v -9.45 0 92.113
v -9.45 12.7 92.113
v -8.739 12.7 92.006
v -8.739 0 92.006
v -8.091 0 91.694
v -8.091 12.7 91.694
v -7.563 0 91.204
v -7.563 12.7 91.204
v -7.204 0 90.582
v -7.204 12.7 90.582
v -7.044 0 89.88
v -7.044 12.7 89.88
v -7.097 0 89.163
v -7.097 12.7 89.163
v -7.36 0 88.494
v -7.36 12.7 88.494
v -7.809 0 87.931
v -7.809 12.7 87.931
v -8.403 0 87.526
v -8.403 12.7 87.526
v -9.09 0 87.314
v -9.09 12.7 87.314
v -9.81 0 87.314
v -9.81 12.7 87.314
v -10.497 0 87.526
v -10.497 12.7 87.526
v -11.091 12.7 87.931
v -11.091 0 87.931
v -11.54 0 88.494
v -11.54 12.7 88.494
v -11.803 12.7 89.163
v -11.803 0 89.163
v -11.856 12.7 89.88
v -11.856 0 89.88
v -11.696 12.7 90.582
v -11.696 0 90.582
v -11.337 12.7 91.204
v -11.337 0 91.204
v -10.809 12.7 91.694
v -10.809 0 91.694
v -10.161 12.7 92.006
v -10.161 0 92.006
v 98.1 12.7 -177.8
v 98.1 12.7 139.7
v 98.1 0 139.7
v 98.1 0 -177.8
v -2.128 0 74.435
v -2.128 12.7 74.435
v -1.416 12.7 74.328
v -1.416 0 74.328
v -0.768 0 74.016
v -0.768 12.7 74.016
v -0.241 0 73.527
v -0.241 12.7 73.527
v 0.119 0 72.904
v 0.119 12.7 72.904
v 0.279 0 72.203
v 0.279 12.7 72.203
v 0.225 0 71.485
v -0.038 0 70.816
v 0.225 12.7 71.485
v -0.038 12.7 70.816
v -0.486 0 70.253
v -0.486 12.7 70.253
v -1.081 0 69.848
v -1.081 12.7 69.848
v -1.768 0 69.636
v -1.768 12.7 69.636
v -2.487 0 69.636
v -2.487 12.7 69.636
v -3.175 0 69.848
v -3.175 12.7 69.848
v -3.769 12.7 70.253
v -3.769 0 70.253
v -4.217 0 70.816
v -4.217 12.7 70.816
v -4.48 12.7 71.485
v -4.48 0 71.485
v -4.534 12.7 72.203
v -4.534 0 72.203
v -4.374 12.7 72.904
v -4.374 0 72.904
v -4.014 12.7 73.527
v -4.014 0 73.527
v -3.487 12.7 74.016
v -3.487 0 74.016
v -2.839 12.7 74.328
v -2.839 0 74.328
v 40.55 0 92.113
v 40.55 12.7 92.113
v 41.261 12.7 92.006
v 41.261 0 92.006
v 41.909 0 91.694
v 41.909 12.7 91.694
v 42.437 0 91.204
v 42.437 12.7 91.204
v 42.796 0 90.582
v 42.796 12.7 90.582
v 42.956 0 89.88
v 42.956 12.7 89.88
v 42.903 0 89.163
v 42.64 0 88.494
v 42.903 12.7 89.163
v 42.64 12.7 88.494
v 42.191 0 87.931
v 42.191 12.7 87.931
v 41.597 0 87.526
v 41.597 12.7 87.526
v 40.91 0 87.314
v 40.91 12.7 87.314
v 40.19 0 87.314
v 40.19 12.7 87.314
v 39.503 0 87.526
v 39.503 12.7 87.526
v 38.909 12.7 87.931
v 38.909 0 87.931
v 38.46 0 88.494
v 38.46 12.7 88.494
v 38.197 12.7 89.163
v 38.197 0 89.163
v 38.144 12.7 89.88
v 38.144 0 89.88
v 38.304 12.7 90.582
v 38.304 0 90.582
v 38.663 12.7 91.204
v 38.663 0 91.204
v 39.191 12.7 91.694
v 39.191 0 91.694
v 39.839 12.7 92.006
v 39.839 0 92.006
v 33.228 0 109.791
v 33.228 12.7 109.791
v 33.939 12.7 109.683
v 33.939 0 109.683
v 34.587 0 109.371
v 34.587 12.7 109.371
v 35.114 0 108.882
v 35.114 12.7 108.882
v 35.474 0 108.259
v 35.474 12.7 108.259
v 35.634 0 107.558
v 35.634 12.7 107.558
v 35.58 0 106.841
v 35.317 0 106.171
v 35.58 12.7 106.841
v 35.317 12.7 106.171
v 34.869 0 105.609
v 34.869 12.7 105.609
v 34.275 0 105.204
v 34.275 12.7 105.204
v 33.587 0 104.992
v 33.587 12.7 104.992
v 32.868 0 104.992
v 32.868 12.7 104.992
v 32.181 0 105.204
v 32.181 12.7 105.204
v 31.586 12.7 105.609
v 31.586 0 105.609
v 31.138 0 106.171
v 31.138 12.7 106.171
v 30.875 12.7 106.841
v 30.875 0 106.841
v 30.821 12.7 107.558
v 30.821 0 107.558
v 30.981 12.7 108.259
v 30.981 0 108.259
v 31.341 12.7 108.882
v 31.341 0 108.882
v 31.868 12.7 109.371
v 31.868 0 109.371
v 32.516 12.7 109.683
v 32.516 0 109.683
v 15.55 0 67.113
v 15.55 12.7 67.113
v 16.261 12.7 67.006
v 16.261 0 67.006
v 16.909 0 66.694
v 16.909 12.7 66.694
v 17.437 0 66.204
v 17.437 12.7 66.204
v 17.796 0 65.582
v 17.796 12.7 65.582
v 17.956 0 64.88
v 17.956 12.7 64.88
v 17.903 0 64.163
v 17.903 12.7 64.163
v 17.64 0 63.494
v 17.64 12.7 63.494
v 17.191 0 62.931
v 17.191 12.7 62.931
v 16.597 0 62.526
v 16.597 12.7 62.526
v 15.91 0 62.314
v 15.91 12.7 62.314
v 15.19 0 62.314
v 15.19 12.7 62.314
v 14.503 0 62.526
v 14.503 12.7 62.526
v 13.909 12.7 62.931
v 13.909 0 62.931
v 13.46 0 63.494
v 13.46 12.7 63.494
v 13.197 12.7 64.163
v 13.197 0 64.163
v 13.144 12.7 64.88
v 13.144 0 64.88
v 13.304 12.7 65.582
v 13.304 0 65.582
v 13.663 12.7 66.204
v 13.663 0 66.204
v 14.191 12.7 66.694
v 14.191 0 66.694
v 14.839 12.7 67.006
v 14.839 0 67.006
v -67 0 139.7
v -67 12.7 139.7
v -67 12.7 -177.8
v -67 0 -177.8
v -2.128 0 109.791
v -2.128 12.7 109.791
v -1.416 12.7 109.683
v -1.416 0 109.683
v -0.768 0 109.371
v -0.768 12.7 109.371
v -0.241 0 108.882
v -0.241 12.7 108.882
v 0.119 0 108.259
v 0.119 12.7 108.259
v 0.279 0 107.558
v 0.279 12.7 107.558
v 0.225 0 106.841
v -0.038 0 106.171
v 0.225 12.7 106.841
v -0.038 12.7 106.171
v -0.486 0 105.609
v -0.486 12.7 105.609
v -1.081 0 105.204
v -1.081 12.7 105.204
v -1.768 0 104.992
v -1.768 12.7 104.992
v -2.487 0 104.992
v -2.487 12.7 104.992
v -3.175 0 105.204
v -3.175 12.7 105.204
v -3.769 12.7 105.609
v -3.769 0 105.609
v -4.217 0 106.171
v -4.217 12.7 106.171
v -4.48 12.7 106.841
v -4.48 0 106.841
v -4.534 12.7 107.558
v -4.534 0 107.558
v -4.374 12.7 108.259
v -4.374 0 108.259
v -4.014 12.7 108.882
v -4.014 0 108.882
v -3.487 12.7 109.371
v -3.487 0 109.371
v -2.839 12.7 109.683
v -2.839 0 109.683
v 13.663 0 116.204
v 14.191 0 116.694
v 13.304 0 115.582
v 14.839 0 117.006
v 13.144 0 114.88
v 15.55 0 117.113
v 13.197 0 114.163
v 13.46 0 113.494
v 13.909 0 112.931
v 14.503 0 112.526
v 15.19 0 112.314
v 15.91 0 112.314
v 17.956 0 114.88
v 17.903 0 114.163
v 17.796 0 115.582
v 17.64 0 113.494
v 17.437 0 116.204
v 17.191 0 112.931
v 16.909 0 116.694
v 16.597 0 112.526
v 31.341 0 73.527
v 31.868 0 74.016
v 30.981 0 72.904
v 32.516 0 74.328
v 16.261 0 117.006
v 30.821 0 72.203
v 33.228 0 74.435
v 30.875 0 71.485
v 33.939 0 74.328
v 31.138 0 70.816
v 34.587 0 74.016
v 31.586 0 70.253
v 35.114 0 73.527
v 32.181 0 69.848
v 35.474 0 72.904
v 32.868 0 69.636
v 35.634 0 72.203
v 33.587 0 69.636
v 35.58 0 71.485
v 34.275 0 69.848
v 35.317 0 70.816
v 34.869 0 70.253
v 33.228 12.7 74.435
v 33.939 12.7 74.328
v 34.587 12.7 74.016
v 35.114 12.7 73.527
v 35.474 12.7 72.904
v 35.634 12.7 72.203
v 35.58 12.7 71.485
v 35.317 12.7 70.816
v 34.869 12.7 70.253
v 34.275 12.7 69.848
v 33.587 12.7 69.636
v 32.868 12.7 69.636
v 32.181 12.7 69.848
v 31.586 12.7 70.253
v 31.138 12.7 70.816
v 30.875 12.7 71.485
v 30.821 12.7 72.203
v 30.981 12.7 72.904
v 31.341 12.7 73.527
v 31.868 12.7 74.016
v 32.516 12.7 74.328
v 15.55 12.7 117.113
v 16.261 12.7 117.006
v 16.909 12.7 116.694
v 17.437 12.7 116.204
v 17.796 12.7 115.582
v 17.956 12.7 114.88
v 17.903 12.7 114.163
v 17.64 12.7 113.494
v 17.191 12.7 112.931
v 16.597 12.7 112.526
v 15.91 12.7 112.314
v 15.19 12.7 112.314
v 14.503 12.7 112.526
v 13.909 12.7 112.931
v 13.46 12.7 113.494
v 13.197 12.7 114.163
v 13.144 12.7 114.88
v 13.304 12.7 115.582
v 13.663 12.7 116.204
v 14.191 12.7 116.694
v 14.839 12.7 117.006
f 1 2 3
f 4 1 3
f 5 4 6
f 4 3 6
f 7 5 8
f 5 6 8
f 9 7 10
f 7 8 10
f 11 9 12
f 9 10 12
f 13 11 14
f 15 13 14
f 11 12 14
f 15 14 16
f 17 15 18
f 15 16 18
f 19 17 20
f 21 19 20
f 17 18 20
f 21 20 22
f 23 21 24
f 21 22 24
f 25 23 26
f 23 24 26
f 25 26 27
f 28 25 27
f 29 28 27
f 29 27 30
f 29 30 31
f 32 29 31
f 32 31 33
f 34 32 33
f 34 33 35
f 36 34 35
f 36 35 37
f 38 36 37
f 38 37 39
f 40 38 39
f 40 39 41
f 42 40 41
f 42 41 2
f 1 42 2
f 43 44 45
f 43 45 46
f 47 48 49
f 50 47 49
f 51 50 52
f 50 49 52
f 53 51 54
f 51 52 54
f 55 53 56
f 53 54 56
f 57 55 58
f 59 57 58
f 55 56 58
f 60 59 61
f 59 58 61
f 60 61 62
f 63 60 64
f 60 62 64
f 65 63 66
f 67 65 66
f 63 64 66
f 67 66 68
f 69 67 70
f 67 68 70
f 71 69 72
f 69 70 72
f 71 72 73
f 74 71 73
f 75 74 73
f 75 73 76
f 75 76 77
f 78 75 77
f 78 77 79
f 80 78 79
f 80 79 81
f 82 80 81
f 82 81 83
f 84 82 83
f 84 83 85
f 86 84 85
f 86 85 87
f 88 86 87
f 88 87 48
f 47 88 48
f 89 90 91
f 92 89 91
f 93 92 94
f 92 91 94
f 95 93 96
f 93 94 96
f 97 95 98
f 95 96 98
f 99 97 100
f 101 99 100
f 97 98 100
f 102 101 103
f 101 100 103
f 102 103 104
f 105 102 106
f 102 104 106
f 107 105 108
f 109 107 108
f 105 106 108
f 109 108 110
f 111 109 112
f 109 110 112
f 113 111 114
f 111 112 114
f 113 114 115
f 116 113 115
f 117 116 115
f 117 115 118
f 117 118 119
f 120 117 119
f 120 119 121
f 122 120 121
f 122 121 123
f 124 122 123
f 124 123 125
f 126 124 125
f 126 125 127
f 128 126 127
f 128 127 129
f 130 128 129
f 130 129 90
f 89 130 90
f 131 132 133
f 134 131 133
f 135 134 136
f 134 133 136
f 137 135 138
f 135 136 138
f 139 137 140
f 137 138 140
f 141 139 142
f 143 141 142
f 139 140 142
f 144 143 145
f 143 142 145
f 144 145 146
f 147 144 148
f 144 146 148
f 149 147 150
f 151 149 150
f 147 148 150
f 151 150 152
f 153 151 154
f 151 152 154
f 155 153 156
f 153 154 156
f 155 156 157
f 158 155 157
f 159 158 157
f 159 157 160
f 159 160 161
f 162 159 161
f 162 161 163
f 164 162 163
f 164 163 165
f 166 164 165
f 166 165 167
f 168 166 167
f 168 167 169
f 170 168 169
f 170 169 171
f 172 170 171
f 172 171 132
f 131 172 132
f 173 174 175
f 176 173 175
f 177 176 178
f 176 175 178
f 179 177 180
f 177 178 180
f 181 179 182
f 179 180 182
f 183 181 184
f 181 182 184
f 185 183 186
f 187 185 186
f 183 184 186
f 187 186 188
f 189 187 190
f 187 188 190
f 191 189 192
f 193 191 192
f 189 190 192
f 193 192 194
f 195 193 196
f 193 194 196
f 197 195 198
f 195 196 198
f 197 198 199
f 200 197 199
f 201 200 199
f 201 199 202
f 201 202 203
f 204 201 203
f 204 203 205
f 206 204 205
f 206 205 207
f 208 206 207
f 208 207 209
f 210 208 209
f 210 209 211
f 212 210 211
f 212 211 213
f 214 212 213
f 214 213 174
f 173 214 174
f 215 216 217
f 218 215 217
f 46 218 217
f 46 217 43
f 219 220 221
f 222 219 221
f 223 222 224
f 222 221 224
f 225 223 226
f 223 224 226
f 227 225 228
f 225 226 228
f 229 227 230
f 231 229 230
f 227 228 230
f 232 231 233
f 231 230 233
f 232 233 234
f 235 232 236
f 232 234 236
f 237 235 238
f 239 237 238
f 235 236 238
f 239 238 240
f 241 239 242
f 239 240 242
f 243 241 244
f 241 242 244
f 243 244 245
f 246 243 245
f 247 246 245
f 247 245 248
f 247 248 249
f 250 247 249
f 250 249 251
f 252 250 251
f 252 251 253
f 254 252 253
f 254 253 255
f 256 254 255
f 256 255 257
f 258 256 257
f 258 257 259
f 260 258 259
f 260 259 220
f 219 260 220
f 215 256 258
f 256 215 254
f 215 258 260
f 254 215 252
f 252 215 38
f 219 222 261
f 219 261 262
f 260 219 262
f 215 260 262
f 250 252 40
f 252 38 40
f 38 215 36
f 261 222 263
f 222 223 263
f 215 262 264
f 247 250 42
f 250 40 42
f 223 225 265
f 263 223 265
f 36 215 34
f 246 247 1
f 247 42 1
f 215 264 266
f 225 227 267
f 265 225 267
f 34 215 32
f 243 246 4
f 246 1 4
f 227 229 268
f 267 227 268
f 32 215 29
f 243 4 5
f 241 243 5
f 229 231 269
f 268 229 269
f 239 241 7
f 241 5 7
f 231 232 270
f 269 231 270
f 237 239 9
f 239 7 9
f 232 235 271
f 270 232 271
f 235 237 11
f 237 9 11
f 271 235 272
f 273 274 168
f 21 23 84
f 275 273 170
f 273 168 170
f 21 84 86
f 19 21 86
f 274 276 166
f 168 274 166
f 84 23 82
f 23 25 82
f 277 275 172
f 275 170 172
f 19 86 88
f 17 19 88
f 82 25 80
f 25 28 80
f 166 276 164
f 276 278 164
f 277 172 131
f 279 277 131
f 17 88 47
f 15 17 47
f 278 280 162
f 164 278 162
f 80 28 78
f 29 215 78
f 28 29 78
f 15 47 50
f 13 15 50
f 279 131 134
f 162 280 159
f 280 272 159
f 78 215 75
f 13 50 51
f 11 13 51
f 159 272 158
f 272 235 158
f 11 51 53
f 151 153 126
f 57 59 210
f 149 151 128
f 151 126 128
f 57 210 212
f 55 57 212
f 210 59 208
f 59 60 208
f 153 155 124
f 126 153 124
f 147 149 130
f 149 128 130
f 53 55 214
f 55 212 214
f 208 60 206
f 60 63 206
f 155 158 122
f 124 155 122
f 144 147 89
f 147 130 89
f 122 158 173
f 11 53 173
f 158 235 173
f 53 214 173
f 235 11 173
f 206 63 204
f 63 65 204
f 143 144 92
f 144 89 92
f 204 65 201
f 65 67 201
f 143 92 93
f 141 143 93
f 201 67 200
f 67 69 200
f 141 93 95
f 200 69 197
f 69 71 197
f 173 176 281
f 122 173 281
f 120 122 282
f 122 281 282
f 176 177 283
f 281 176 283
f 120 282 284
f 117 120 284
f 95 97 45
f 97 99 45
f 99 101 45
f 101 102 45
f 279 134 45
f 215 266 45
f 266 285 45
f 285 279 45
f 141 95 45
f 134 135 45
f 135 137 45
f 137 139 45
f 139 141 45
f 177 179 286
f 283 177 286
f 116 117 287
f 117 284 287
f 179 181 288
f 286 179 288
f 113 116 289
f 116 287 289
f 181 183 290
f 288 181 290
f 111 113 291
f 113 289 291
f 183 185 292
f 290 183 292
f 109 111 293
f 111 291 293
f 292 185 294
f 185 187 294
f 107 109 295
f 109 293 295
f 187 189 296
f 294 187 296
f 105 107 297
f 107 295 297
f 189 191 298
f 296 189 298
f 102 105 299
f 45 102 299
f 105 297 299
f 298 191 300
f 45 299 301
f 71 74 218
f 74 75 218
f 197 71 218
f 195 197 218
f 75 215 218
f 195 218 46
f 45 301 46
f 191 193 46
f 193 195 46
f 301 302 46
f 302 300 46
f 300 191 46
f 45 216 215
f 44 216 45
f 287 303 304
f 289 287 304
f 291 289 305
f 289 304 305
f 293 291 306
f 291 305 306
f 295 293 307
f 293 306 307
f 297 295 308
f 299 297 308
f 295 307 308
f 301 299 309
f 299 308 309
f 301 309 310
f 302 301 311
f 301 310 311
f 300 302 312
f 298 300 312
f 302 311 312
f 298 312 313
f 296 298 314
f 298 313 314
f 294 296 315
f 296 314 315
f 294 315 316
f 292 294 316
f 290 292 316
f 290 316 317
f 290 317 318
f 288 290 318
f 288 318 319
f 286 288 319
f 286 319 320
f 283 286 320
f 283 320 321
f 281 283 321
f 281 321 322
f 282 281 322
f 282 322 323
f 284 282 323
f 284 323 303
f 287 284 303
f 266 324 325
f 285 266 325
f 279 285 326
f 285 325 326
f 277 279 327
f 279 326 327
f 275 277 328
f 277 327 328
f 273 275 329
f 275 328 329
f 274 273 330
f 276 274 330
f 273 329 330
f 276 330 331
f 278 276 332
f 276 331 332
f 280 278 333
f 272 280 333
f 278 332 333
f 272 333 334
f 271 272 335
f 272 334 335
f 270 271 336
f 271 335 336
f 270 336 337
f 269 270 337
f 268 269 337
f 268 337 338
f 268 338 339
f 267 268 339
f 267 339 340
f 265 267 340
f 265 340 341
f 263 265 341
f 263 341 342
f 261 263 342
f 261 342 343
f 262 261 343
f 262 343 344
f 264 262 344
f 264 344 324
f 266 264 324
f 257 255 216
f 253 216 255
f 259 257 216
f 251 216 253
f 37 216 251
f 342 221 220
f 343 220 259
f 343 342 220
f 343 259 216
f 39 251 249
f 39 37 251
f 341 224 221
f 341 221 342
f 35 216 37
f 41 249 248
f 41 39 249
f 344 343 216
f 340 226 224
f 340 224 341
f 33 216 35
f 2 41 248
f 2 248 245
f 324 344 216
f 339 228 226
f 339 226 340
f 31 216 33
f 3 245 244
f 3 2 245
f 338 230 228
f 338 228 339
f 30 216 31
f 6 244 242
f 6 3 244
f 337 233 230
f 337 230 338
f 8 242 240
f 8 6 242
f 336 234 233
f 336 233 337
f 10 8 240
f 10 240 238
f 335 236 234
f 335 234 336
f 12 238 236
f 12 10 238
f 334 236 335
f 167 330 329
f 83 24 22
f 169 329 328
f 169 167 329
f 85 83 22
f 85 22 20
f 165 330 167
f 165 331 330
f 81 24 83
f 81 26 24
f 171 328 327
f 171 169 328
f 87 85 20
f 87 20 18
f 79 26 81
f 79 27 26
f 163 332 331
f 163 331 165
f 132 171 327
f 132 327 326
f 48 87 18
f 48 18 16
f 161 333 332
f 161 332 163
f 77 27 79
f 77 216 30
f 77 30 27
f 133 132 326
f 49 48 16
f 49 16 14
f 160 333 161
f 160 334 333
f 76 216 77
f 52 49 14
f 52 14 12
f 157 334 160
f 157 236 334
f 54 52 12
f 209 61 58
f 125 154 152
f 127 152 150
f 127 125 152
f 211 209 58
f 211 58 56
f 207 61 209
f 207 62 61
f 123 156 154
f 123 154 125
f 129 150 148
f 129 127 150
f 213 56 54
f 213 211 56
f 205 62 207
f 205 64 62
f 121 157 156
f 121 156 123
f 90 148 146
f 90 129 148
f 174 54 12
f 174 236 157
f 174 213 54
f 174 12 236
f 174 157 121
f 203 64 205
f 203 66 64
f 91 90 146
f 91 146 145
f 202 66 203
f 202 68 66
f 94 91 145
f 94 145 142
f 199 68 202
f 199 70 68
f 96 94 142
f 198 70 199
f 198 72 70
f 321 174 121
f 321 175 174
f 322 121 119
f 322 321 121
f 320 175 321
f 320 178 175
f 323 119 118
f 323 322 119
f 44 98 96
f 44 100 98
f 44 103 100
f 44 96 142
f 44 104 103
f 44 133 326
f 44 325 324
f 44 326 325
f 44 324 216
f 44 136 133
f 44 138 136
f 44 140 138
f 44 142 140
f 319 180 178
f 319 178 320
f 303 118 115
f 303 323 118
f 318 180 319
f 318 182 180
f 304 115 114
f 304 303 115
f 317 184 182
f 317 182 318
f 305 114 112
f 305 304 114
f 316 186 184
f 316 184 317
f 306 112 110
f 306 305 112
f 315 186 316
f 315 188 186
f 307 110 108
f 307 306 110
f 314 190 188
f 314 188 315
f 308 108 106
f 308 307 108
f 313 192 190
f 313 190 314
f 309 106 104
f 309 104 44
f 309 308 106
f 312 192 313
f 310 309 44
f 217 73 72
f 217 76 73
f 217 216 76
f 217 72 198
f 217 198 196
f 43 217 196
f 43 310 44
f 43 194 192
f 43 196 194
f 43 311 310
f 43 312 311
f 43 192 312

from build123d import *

# Parameters (mm, degrees)
SKETCH1_W           = 254
SKETCH1_H           = 355.6
BASE_EXTRUDE_DEPTH  = 12.7
SKETCH6_OUTSIDE_W   = 343.436
SKETCH6_OUTSIDE_H   = 445.036
SKETCH6_OUTSIDE_W_2 = 165.1
SKETCH6_OUTSIDE_H_2 = 317.5
CUT_TO_SIZE_DEPTH   = 219.867836833
SKETCH12_R          = 2.413
CUT_EXTRUDE3_DEPTH  = 204.464345771


with BuildPart() as part:
    # Sketch1 → Base_extrude (new body)
    with BuildSketch(Plane(origin=(0, 0, 0), x_dir=(1, 0, 0), z_dir=(0, 1, 0))):
        Rectangle(SKETCH1_W, SKETCH1_H)
    extrude(amount=BASE_EXTRUDE_DEPTH)

    # Sketch6 outside → Cut_to_size (cut, through all)
    with BuildSketch(Plane(origin=(0, 12.7, 0), x_dir=(1, 0, 0), z_dir=(0, 1, 0))):
        Rectangle(SKETCH6_OUTSIDE_W, SKETCH6_OUTSIDE_H)
        with Locations((15.55, 19.05)):
            Rectangle(SKETCH6_OUTSIDE_W_2, SKETCH6_OUTSIDE_H_2, mode=Mode.SUBTRACT)
    extrude(amount=-CUT_TO_SIZE_DEPTH, mode=Mode.SUBTRACT)

    # Sketch12 → Cut-Extrude3 (cut, through all)
    with BuildSketch(Plane(origin=(0, 12.7, 0), x_dir=(1, 0, 0), z_dir=(0, 1, 0))):
        with Locations(Location((33.22766953, -107.37766953, 0), (0, 0, 270))):
            Circle(SKETCH12_R)
        with Locations(Location((40.55, -89.7, 0), (0, 0, 270))):
            Circle(SKETCH12_R)
        with Locations(Location((33.22766953, -72.02233047, 0), (0, 0, 270))):
            Circle(SKETCH12_R)
        with Locations(Location((15.55, -64.7, 0), (0, 0, 270))):
            Circle(SKETCH12_R)
        with Locations(Location((-2.12766953, -72.02233047, 0), (0, 0, 270))):
            Circle(SKETCH12_R)
        with Locations(Location((-9.45, -89.7, 0), (0, 0, 270))):
            Circle(SKETCH12_R)
        with Locations(Location((-2.12766953, -107.37766953, 0), (0, 0, 270))):
            Circle(SKETCH12_R)
        with Locations(Location((15.55, -114.7, 0), (0, 0, 270))):
            Circle(SKETCH12_R)
    extrude(amount=-CUT_EXTRUDE3_DEPTH, mode=Mode.SUBTRACT)


solid = part.part
